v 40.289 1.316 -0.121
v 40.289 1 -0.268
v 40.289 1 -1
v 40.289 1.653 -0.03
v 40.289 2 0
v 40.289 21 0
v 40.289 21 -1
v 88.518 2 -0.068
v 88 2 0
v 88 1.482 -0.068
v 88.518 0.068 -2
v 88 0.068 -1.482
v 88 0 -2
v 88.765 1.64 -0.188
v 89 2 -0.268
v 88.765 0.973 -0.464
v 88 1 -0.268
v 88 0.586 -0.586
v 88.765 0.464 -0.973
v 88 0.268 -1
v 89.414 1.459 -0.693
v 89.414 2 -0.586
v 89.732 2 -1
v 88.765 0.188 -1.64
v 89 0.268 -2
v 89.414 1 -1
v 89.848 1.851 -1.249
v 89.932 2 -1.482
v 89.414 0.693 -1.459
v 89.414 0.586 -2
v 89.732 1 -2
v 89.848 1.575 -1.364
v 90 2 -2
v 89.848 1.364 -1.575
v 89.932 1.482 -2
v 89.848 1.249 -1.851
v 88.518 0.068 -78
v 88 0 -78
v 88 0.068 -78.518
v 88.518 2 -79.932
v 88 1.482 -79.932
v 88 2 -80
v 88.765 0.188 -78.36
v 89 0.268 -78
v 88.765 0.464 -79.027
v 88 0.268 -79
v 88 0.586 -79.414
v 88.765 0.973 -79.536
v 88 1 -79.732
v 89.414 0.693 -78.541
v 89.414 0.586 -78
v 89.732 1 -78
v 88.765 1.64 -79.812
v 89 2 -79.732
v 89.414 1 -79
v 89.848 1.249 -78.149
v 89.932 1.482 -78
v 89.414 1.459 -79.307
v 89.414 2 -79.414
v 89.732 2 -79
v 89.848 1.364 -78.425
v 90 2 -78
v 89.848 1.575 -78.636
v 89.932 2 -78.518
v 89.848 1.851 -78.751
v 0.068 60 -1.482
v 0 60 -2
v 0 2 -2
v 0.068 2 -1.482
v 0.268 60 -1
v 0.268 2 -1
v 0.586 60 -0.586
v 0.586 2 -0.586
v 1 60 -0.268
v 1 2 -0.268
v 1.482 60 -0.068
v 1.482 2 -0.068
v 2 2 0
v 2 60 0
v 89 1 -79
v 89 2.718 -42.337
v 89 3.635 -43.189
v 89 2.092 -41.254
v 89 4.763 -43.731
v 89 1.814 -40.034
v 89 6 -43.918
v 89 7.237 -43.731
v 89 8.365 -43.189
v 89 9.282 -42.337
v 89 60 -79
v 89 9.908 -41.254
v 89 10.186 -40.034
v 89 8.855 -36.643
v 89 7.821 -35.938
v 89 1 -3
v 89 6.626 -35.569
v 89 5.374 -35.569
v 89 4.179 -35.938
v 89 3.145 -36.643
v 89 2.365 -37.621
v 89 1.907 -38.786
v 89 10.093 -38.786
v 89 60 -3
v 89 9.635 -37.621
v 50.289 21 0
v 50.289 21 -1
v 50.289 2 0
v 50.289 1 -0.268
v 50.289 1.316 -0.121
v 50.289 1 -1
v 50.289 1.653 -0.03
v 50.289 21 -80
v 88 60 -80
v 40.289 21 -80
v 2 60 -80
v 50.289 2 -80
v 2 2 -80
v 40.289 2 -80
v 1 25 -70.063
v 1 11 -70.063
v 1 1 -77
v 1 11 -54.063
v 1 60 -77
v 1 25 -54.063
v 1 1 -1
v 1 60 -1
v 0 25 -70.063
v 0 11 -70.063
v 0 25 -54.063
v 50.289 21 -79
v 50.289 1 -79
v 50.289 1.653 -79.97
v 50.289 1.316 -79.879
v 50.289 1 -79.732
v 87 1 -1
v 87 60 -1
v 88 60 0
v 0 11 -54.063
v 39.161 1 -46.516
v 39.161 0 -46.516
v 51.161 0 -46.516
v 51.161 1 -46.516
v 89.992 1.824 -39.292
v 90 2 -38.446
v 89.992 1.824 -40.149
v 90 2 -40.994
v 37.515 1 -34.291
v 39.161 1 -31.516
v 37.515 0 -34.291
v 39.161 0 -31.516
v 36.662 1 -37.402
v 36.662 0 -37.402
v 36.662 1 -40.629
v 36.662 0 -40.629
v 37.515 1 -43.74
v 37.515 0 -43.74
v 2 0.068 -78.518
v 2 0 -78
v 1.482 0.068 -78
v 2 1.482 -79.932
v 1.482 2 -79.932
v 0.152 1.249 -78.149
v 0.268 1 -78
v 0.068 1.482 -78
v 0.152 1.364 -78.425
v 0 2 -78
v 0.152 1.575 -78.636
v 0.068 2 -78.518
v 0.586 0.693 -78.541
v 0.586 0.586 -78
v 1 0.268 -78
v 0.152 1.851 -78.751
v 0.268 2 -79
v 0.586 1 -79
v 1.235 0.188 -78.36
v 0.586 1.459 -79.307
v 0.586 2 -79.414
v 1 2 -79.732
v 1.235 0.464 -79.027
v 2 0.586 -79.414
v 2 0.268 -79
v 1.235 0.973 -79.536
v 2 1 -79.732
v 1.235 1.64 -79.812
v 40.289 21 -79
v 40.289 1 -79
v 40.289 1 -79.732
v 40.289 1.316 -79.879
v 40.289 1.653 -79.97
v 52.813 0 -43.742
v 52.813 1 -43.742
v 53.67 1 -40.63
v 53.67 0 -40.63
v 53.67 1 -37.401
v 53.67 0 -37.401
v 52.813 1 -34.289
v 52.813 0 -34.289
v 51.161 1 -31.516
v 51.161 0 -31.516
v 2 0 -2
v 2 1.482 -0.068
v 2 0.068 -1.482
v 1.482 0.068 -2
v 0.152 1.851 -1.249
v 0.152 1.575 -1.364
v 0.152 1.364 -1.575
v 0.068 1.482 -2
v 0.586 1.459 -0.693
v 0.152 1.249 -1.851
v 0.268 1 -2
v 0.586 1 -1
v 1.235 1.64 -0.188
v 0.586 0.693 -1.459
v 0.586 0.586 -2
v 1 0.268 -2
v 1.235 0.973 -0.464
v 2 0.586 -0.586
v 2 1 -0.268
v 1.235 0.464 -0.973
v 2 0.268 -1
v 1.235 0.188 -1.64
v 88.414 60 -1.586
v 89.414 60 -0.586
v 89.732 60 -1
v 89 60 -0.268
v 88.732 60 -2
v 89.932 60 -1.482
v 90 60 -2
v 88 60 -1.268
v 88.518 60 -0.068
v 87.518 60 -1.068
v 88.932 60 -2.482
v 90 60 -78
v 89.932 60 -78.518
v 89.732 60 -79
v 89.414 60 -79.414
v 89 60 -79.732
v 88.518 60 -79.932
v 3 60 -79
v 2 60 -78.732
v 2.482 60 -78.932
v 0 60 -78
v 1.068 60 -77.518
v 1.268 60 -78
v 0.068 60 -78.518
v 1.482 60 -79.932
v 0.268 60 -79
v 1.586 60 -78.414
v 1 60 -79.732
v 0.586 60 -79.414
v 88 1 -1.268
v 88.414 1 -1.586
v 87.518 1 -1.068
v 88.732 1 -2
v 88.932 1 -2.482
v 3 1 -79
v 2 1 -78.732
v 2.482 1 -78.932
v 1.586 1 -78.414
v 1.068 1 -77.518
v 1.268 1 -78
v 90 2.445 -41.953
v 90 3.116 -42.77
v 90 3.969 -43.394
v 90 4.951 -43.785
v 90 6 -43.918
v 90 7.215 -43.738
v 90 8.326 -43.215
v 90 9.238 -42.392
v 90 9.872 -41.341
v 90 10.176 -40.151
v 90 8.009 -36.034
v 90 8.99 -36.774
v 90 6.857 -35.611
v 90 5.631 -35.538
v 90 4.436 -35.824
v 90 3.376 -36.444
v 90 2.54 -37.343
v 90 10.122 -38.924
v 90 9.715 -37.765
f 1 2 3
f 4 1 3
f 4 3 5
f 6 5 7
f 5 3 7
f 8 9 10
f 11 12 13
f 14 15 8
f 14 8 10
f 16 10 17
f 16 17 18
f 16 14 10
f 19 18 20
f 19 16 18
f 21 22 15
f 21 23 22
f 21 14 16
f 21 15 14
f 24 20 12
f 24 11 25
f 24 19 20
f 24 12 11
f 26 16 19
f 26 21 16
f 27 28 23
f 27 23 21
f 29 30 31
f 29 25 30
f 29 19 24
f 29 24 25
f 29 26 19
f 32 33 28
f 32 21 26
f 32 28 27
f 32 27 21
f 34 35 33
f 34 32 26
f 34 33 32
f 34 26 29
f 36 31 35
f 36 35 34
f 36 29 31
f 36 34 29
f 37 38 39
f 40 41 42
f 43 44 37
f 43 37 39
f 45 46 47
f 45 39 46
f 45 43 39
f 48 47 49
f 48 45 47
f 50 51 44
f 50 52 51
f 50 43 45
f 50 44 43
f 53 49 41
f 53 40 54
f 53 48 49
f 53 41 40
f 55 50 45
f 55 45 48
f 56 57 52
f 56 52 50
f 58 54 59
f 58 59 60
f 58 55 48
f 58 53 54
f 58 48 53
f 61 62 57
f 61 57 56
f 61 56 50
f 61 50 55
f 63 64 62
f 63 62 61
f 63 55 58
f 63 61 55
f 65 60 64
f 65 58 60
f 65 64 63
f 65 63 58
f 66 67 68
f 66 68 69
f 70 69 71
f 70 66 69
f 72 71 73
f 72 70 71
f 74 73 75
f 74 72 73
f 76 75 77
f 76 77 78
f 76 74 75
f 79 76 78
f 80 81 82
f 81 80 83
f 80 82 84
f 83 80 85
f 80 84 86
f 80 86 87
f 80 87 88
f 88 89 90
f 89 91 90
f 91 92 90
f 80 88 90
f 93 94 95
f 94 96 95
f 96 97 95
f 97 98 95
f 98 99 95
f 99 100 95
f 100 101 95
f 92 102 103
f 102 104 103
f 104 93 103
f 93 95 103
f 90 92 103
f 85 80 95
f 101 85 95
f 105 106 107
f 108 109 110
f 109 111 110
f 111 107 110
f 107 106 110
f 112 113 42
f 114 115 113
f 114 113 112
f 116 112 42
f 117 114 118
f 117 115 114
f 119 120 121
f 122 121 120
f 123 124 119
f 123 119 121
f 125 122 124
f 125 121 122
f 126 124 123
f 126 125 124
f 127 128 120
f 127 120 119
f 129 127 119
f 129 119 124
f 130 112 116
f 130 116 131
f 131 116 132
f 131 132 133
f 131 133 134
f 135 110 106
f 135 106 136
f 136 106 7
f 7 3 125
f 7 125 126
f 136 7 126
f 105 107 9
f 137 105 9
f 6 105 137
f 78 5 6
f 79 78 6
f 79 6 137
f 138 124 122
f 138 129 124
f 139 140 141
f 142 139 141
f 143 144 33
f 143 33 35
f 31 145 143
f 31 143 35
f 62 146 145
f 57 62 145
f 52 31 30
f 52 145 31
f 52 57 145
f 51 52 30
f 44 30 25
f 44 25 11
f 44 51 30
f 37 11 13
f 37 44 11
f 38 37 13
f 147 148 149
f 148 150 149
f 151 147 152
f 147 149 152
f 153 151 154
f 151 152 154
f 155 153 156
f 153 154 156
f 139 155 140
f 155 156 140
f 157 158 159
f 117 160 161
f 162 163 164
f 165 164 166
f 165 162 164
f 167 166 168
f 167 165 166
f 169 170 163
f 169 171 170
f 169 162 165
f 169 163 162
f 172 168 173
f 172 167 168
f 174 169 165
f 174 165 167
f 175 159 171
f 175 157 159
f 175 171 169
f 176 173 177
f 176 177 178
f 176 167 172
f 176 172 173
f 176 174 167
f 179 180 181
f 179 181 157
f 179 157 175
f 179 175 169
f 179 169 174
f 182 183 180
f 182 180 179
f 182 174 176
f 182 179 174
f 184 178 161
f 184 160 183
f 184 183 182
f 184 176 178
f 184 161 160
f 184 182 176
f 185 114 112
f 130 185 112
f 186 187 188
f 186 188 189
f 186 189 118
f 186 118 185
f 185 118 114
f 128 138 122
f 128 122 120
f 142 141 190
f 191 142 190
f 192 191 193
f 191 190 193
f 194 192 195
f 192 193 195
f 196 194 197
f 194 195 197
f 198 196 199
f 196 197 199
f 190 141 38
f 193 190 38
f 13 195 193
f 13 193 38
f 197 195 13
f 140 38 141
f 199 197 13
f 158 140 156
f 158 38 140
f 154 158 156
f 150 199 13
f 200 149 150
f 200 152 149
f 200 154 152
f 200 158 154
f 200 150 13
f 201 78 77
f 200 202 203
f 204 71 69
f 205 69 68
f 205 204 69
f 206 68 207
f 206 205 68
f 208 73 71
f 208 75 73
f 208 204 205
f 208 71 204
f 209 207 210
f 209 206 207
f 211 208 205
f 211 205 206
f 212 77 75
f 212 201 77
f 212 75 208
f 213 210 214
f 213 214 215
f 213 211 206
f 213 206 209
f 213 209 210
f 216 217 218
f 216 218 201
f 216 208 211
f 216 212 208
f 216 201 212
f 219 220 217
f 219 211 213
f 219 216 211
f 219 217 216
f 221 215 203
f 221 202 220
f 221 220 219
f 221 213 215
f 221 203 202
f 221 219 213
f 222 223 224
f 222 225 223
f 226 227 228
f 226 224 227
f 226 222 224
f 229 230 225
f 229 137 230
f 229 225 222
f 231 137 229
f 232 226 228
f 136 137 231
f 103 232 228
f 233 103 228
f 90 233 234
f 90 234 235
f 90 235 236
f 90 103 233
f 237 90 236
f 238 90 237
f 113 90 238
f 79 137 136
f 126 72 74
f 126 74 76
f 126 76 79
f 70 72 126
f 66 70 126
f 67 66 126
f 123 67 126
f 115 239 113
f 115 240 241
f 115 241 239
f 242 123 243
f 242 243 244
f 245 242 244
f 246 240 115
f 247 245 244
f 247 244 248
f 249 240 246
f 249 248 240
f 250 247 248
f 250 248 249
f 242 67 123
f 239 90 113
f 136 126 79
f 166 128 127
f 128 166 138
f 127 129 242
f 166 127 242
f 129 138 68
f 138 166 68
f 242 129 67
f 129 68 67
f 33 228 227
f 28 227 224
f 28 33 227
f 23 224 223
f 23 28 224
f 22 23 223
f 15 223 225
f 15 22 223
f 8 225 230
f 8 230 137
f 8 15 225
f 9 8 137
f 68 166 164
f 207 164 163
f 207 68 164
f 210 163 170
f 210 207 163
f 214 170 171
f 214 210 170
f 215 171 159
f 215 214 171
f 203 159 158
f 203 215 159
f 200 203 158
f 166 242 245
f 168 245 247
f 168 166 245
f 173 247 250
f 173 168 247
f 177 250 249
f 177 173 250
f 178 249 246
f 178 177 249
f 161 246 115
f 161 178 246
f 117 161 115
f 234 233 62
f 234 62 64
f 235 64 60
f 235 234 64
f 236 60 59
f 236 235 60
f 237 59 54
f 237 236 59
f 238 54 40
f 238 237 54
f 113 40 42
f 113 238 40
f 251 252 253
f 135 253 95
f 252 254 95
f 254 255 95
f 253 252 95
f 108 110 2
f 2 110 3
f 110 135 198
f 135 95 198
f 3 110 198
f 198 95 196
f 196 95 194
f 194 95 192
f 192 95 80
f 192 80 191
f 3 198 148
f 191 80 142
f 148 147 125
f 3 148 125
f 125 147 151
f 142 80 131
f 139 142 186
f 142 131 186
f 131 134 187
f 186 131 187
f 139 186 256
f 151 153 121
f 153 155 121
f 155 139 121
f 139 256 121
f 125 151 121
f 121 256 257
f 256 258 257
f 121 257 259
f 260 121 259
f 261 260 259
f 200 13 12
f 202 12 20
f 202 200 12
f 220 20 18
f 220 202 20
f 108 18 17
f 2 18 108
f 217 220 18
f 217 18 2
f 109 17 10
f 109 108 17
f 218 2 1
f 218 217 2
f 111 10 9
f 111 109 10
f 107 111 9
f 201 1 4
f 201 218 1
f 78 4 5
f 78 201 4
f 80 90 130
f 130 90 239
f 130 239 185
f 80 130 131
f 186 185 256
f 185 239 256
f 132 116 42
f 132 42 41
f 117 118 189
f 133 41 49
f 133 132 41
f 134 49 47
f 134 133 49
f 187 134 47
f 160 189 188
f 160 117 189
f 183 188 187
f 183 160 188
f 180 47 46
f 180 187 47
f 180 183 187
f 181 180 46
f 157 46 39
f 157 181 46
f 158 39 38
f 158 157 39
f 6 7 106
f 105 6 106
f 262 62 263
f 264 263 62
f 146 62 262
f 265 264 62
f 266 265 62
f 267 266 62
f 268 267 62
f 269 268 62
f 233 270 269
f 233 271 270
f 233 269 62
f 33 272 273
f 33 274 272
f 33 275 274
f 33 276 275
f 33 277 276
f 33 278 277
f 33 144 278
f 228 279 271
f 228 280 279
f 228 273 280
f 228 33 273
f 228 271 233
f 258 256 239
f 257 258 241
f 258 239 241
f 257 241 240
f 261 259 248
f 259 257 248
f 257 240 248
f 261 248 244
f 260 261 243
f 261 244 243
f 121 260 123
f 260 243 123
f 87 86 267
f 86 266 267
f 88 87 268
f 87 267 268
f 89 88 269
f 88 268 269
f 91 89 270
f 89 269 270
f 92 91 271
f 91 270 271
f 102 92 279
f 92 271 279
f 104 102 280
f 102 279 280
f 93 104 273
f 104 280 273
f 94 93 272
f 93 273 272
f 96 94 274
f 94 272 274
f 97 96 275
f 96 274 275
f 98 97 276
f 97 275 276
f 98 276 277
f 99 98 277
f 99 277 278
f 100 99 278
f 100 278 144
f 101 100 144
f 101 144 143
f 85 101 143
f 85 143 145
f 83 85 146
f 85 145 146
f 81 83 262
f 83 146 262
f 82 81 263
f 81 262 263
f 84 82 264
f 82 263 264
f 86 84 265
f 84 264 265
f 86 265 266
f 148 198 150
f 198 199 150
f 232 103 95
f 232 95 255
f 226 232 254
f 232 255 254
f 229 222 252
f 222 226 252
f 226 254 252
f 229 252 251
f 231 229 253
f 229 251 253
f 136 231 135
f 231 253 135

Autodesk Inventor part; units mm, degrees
ref_plane "YZ Plane" through (0, 0, 0) normal (1, 0, 0) x (0, 1, 0)
ref_plane "XZ Plane" through (0, 0, 0) normal (0, 1, 0) x (-1, 0, 0)
ref_plane "XY Plane" through (0, 0, 0) normal (0, 0, 1) x (1, 0, 0)
sketch "Esquisse1" plane through (0, 0, 0) normal (1, 0, 0) x (0, 1, 0)
  line L0 (0, 0) -> (60, 0)
  line L1 (60, 0) -> (60, -80)
  line L2 (60, -80) -> (0, -80)
  line L3 (0, -80) -> (0, 0)
  line L4 (0, -45) -> (0, -35)
  line L5 (0, -35) -> (0, -45)
  point P0 (12.5, -45)
  point P1 (0, -40)
  point P2 (0, -40)
  dimension "d0" = 80
  dimension "d1" = 60
  dimension "d4" = 40
extrude "Extrusion1" add sketch "Esquisse1" along normal blind 90
sketch "Esquisse2" plane through (0, 0, 0) normal (-1, 0, 0) x (0, 0, 1)
  line L0 (0, 0) -> (-80, 0) projected
  line L1 (-45, 0) -> (-35, 0)
  line L2 (0, 0) -> (-80, 0) projected
  point P0 (-40, 0)
  point P1 (-40, 0)
  point P2 (-40, 1)
  point P3 (-41.0501, 0)
  point P4 (-35, 9.6008)
  point P5 (-45, 11)
  dimension "d9" = 40
  dimension "d14" = 80
shell "Coque1" thickness 1 removed faces 1 at (30, 60, -53.3333)
sketch "Esquisse3" plane through (0, 0, 0) normal (-1, 0, 0) x (0, 0, 1)
  point P0 (0, 0)
sketch "Esquisse4" plane through (0, 0, 0) normal (-1, 0, 0) x (0, 0, 1)
  point P0 (0, 0)
sketch "Esquisse5" plane through (0, 0, -80) normal (0, 0, -1) x (-1, 0, 0)
  line L0 (-50.2889, 1) -> (-40.2889, 1)
  line L1 (-40.2889, 1) -> (-40.2889, 21)
  line L2 (-40.2889, 21) -> (-50.2889, 21)
  line L3 (-50.2889, 21) -> (-50.2889, 1)
  line L4 (0, 0) -> (-90, 0) projected
  line L5 (0, 0) -> (-90, 0) projected
  line L6 (-1, 1) -> (-89, 1) projected
  point P0 (-45, 0)
  point P1 (-40.2889, 0)
  point P2 (-49.4557, 1)
  point P3 (-46.3284, -7.001)
  point P4 (-44.591, 0)
  point P5 (-46.3284, -7.537)
  point P6 (-50.2889, 11)
  point P7 (-50.2889, 11)
  point P8 (-49.5179, 0)
  point P9 (-49.2163, 0)
  dimension "d15" = 10
  dimension "d16" = 20
  dimension "d17" = 1
  dimension "d18" = 88
  dimension "d19" = 90
sketch "Esquisse8" plane through (0, 0, 0) normal (0, 0, 1) x (1, 0, 0)
  point P0 (0, 0)
extrude "Extrusion2" cut sketch "Esquisse5" against normal blind 90
sketch "Esquisse9" plane through (0, 0, 0) normal (-1, 0, 0) x (0, 0, 1)
  line L0 (-50.5224, 1) -> (-50.5224, 2)
  line L1 (-66.5224, 2) -> (-66.5224, 1)
  line L2 (-70.063, 25) -> (-54.063, 25)
  line L3 (-54.063, 25) -> (-54.063, 11)
  line L4 (-54.063, 11) -> (-70.063, 11)
  line L5 (-70.063, 11) -> (-70.063, 25)
  line L6 (0, 0) -> (-80, 0) projected
  dimension "d23" = 1
  dimension "d24" = 11
  dimension "d25" = 14
  dimension "d26" = 16
extrude "Extrusion3" cut sketch "Esquisse9" against normal blind 50
sketch "Esquisse10" plane through (90, 0, 0) normal (1, 0, 0) x (0, 0, -1)
  circle A0 centre (39.7201, 6) radius 4.1979
  line L0 (0, 0) -> (80, 0) projected
  dimension "d29" = 6
extrude "Extrusion4" cut sketch "Esquisse10" against normal blind 50
sketch "Esquisse11" plane through (0, 0, -80) normal (0, -1, 0) x (1, 0, 0)
  line L0 (39.1611, 33.4845) -> (51.1611, 33.4845)
  line L1 (51.1611, 33.4845) -> (51.1611, 48.4845)
  line L2 (51.1611, 48.4845) -> (39.1611, 48.4845)
  line L3 (39.1611, 48.4845) -> (39.1611, 33.4845)
  arc A0 (39.1611, 48.4845) -> (39.1611, 33.4845) centre (48.6459, 40.9845) ccw
  arc A1 (51.1611, 33.4845) -> (51.1611, 48.4845) centre (41.7255, 40.9845) ccw
  point P0 (0, 80)
  point P1 (36.5541, 40.9845)
  point P2 (53.7787, 40.9845)
  point P3 (45.1019, 41.2499)
  point P4 (27.4865, 33.4896)
  point P5 (27.0422, 33.4896)
  dimension "d32" = 15
  dimension "d33" = 12
  dimension "d34" = 6.9205
  dimension "d35" = 12.0918
extrude "Extrusion5" cut sketch "Esquisse11" against normal blind 10
fillet "Congé1" radius 2 2 edges at (1, 30.5, -79) (45, 0, -80)
fillet "Congé2" radius 2 2 edges at (90, 30, 0) (45, 0, 0)
fillet "Congé3" radius 2 5 edges at (90, 0.5858, -79.4142) (90, 31, -80) (89.4142, 0.5858, -0.5858) (90, 0, -40) (89, 30.5, -1)
fillet "Congé4" radius 2 5 edges at (0, 0.5858, -79.4142) (0, 31, -80) (0, 0.5858, -0.5858) (0, 31, 0) (0, 0, -40)
properties part number "corps" material "Plastique ABS"
